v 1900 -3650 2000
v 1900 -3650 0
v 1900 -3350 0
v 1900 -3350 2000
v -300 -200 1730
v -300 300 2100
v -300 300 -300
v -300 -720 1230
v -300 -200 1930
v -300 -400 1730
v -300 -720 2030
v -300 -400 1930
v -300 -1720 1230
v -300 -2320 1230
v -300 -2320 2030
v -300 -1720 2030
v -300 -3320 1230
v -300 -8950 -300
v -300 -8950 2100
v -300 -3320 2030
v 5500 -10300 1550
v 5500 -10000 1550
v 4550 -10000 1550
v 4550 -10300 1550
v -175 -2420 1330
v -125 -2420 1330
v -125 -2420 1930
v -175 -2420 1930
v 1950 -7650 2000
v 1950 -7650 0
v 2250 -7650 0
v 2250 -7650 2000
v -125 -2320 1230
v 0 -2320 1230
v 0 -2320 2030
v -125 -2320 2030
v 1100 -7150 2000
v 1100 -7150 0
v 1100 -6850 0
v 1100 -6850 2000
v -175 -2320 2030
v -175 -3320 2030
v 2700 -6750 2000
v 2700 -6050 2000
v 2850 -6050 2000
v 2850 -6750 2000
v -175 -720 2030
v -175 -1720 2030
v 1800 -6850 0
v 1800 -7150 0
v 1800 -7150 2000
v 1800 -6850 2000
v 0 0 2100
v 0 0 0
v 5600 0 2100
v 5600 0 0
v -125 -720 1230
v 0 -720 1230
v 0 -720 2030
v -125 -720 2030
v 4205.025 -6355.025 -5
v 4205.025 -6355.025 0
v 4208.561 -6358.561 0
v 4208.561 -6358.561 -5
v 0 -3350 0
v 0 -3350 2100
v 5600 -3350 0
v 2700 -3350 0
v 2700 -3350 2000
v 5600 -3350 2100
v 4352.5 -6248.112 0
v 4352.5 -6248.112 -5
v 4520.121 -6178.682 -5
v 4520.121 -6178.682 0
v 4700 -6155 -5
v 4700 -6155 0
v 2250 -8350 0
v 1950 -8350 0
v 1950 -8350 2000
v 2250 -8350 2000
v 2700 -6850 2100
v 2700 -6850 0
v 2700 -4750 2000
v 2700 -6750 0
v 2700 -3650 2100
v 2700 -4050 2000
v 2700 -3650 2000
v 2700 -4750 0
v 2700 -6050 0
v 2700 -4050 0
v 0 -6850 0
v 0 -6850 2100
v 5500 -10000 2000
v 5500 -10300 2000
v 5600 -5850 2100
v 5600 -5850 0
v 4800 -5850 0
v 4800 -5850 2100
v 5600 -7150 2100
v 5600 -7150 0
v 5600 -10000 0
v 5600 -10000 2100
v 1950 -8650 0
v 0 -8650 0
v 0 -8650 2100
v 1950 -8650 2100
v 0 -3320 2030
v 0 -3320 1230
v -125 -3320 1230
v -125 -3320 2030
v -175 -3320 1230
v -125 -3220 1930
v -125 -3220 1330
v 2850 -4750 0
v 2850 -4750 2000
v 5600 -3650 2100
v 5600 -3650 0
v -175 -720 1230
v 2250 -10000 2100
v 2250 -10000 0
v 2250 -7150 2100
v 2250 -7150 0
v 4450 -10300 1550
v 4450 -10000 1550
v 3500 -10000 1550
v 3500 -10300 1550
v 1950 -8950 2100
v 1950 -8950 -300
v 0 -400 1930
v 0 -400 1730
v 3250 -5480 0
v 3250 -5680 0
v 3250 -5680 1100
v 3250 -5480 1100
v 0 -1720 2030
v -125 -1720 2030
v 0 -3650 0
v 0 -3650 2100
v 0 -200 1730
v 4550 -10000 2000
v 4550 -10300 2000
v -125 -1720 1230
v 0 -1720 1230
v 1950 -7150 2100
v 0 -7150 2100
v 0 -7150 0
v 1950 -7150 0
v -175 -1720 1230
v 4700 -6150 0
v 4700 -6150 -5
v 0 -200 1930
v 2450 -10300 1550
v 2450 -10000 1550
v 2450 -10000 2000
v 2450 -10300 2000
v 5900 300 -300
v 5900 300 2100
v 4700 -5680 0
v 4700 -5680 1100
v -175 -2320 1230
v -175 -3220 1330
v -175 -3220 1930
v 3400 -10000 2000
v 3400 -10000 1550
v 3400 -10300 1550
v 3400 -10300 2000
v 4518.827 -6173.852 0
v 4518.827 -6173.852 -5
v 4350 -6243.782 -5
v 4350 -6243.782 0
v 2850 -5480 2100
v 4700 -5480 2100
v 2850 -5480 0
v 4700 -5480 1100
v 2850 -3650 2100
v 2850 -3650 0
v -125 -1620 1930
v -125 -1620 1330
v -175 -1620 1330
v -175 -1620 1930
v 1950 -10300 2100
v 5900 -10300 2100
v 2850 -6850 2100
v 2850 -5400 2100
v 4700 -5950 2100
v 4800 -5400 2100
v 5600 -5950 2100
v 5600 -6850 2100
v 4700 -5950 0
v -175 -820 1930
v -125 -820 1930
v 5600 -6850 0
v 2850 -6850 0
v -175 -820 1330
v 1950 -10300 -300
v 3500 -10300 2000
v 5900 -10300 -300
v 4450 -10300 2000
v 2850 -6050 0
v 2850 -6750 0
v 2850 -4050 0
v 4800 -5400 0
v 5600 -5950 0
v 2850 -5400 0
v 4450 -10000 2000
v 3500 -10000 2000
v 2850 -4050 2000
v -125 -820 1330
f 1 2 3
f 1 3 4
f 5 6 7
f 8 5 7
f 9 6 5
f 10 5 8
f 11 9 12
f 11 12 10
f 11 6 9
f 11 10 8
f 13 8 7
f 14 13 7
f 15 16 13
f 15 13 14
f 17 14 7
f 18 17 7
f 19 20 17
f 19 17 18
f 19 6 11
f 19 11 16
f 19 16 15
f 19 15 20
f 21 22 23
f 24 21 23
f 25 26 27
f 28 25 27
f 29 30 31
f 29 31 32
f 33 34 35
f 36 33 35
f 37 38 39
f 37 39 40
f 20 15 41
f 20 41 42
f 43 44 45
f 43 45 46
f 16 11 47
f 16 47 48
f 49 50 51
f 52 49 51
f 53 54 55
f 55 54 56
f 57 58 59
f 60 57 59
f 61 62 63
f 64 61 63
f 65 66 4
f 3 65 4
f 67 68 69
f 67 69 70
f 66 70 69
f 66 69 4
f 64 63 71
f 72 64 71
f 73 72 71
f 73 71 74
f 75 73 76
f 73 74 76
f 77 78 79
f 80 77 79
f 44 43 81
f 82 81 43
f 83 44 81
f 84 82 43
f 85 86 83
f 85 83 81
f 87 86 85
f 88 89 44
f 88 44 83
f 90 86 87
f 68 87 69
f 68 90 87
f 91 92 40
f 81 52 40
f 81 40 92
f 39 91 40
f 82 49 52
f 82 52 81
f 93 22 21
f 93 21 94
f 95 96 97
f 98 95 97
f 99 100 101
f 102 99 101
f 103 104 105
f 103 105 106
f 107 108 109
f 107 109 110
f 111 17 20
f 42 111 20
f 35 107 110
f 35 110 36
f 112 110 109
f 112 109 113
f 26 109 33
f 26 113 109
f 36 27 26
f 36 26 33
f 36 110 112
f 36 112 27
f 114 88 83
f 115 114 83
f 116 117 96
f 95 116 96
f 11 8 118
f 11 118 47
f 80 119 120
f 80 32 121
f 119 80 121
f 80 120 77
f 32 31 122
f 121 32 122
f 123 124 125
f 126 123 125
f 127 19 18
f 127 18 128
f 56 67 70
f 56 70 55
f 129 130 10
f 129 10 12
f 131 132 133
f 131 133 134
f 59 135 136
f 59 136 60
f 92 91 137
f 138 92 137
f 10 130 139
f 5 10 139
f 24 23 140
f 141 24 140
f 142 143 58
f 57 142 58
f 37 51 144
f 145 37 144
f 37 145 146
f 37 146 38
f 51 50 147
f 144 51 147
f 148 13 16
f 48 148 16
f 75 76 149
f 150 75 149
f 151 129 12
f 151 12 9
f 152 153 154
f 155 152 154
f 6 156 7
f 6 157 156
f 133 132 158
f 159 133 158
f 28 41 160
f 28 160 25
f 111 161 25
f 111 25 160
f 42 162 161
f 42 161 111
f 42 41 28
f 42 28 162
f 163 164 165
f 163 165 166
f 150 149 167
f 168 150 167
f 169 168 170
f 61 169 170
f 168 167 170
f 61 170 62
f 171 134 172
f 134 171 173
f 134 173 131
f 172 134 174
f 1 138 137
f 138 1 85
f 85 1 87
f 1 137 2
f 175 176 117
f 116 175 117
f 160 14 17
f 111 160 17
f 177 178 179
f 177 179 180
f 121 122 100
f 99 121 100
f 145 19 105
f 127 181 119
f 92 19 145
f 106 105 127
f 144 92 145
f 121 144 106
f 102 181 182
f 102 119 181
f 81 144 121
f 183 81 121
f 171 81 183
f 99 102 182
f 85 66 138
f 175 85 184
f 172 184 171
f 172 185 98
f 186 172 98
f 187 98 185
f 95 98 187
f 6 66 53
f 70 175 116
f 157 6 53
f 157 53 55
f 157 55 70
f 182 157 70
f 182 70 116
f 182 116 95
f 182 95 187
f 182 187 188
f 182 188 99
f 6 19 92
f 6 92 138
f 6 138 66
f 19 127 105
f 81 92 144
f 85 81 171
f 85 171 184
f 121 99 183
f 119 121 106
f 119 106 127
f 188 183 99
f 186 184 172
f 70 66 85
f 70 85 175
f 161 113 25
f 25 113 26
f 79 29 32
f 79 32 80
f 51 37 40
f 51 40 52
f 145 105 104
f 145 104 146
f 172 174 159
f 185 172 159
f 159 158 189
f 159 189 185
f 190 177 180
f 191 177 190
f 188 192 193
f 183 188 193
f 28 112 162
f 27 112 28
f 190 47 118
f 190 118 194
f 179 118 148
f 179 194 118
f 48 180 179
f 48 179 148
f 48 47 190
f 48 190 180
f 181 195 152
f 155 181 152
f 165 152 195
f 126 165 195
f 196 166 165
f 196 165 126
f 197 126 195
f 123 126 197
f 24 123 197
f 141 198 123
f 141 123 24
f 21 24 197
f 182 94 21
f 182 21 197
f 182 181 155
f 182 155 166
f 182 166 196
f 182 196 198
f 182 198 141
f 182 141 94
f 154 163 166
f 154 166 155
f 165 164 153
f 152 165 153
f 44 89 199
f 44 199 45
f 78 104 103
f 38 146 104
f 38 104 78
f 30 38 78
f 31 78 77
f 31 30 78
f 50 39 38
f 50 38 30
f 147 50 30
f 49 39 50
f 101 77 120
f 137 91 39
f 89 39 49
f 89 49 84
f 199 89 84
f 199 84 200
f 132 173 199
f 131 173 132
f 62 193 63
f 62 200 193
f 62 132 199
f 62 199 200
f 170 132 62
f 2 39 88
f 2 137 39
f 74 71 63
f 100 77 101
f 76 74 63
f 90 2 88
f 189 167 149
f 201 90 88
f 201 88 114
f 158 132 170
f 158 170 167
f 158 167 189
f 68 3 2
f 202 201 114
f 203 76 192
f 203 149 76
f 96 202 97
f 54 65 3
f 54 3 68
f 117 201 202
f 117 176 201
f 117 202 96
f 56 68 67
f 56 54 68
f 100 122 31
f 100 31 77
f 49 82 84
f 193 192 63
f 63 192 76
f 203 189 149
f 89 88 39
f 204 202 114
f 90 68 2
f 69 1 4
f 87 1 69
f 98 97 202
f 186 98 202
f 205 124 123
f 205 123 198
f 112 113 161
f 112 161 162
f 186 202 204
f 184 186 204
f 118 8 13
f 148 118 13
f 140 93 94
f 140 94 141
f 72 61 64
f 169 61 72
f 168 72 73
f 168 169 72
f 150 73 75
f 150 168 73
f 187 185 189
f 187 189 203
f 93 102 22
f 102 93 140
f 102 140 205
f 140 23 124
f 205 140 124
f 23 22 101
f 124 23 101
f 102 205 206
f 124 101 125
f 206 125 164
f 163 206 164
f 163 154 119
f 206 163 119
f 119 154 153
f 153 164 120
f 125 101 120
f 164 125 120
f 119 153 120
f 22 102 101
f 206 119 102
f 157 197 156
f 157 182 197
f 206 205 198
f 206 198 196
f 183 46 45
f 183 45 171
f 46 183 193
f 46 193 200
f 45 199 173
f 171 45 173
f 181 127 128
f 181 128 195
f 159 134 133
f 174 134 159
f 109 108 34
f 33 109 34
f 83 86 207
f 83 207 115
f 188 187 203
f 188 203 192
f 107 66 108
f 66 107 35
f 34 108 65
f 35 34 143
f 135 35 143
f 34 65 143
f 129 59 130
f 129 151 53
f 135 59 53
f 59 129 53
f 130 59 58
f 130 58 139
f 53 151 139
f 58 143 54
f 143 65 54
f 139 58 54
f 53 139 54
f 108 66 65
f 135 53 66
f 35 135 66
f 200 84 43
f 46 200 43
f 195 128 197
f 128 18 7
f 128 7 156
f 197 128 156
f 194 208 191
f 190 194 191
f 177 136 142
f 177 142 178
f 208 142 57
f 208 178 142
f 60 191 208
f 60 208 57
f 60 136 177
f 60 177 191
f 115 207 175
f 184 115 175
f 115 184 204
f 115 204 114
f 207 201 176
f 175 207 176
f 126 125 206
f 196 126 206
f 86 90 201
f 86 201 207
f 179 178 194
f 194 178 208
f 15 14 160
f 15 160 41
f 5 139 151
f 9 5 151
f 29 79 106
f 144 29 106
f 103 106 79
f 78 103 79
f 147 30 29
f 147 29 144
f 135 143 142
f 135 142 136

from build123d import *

# Parameters (mm, degrees)
F0_W      = 1950
F0_H      = 1500
F0_W_2    = 2700
F0_H_2    = 3200
F0_W_3    = 5600
F0_H_3    = 3350
F1_DEPTH  = 2100
F3_DEPTH  = 300
F4_W      = 950
F4_H      = 450
F5_DEPTH  = 300
F6_W      = 700
F6_H      = 2000
F7_DEPTH  = 300
F8_W      = 700
F8_H      = 2000
F9_DEPTH  = 300
F10_W     = 800
F10_H     = 2000
F11_DEPTH = 300
F12_W     = 700
F12_H     = 2000
F13_DEPTH = 150
F14_W     = 800
F14_H     = 200
F14_W_2   = 200
F15_DEPTH = 300.001
F16_W     = 800
F16_H     = 600
F16_W_2   = 200
F16_H_2   = 200
F17_DEPTH = 300.001
F18_W     = 1000
F18_H     = 800
F19_DEPTH = 125
F20_W     = 1000
F20_H     = 800
F21_DEPTH = 125
F22_W     = 1450
F22_H     = 200
F23_DEPTH = 1100
F25_DEPTH = 5


with BuildPart() as f1:
    # F0 (on Top) → F1 (new body)
    with BuildSketch(Plane.XY):
        Polygon((5900, -10300), (5900, 300), (-300, 300), (-300, -8950), (1950, -8950), (1950, -10300), align=None)
        with Locations((975, -7900)):
            Rectangle(F0_W, F0_H, mode=Mode.SUBTRACT)
        with Locations((1350, -5250)):
            Rectangle(F0_W_2, F0_H_2, mode=Mode.SUBTRACT)
        Polygon((5600, -7150), (5600, -8650), (5600, -10000), (2250, -10000), (2250, -8650), (2250, -7150), align=None, mode=Mode.SUBTRACT)
        Polygon((5600, -6850), (2850, -6850), (2850, -5480), (4700, -5480), (4700, -5950), (5600, -5950), align=None, mode=Mode.SUBTRACT)
        Polygon((2850, -5400), (2850, -3650), (5600, -3650), (5600, -5850), (4800, -5850), (4800, -5400), align=None, mode=Mode.SUBTRACT)
        with Locations((2800, -1675)):
            Rectangle(F0_W_3, F0_H_3, mode=Mode.SUBTRACT)
    extrude(amount=F1_DEPTH)

    # F2 (on face) → F3 (join)
    with BuildSketch(Plane.XY):
        Polygon((-300, 300), (-300, -8950), (1950, -8950), (1950, -10300), (5900, -10300), (5900, 300), align=None)
    extrude(amount=-F3_DEPTH)

    # F4 (on face) → F5 (cut, through all)
    with BuildSketch(Plane(origin=(0, -10000, 0), x_dir=(-1, 0, 0), z_dir=(0, 1, 0))):
        with Locations((-5025, 1775)):
            Rectangle(F4_W, F4_H)
        with Locations((-3975, 1775)):
            Rectangle(F4_W, F4_H)
        with Locations((-2925, 1775)):
            Rectangle(F4_W, F4_H)
    extrude(amount=-F5_DEPTH, mode=Mode.SUBTRACT)

    # F6 (on face) → F7 (cut, through all)
    with BuildSketch(Plane.XZ.offset(7150)):
        with Locations((1450, 1000)):
            Rectangle(F6_W, F6_H)
    extrude(amount=-F7_DEPTH, mode=Mode.SUBTRACT)

    # F8 (on face) → F9 (cut, through all)
    with BuildSketch(Plane(origin=(1950, 0, 0), x_dir=(0, -1, 0), z_dir=(-1, 0, 0))):
        with Locations((8000, 1000)):
            Rectangle(F8_W, F8_H)
    extrude(amount=-F9_DEPTH, mode=Mode.SUBTRACT)

    # F10 (on face) → F11 (cut, through all)
    with BuildSketch(Plane.XZ.offset(3650)):
        with Locations((2300, 1000)):
            Rectangle(F10_W, F10_H)
    extrude(amount=-F11_DEPTH, mode=Mode.SUBTRACT)

    # F12 (on face) → F13 (cut, through all)
    with BuildSketch(Plane(origin=(2700, 0, 0), x_dir=(0, -1, 0), z_dir=(-1, 0, 0))):
        with Locations((6400, 1000)):
            Rectangle(F12_W, F12_H)
        with Locations((4400, 1000)):
            Rectangle(F12_W, F12_H)
    extrude(amount=-F13_DEPTH, mode=Mode.SUBTRACT)

    # F14 (on face) → F15 (cut, through all)
    with BuildSketch(Plane.YZ):
        with Locations((-2820, 1830)):
            Rectangle(F14_W, F14_H)
        with Locations((-300, 1830)):
            Rectangle(F14_W_2, F14_H)
    extrude(amount=-F15_DEPTH, mode=Mode.SUBTRACT)

    # F16 (on face) → F17 (cut, through all)
    with BuildSketch(Plane.YZ):
        with Locations((-2820, 1630)):
            Rectangle(F16_W, F16_H)
        with Locations((-1220, 1630)):
            Rectangle(F16_W, F16_H)
        with Locations((-300, 1830)):
            Rectangle(F16_W_2, F16_H_2)
    extrude(amount=-F17_DEPTH, mode=Mode.SUBTRACT)

    # F18 (on face) → F19 (cut)
    with BuildSketch(Plane.YZ):
        with Locations((-2820, 1630)):
            Rectangle(F18_W, F18_H)
        with Locations((-1220, 1630)):
            Rectangle(F18_W, F18_H)
    extrude(amount=-F19_DEPTH, mode=Mode.SUBTRACT)

    # F20 (on face) → F21 (cut)
    with BuildSketch(Plane(origin=(-300, 0, 0), x_dir=(0, -1, 0), z_dir=(-1, 0, 0))):
        with Locations((2820, 1630)):
            Rectangle(F20_W, F20_H)
        with Locations((1220, 1630)):
            Rectangle(F20_W, F20_H)
    extrude(amount=-F21_DEPTH, mode=Mode.SUBTRACT)

    # F22 (on face) → F23 (join)
    with BuildSketch(Plane.XY):
        with Locations((3975, -5580)):
            Rectangle(F22_W, F22_H)
    extrude(amount=F23_DEPTH)

    # F24 (on face) → F25 (cut)
    with BuildSketch(Plane.XY):
        with BuildLine():
            ThreePointArc((4700, -6150), (4432.121597, -6203.284327), (4205.025253, -6355.025253))
            Line((4205.025253, -6355.025253), (4208.560787, -6358.560787))
            ThreePointArc((4208.560787, -6358.560787), (4434.035015, -6207.903725), (4700, -6155))
            Line((4700, -6155), (4700, -6150))
        make_face()
    extrude(amount=-F25_DEPTH, mode=Mode.SUBTRACT)


solid = f1.part
